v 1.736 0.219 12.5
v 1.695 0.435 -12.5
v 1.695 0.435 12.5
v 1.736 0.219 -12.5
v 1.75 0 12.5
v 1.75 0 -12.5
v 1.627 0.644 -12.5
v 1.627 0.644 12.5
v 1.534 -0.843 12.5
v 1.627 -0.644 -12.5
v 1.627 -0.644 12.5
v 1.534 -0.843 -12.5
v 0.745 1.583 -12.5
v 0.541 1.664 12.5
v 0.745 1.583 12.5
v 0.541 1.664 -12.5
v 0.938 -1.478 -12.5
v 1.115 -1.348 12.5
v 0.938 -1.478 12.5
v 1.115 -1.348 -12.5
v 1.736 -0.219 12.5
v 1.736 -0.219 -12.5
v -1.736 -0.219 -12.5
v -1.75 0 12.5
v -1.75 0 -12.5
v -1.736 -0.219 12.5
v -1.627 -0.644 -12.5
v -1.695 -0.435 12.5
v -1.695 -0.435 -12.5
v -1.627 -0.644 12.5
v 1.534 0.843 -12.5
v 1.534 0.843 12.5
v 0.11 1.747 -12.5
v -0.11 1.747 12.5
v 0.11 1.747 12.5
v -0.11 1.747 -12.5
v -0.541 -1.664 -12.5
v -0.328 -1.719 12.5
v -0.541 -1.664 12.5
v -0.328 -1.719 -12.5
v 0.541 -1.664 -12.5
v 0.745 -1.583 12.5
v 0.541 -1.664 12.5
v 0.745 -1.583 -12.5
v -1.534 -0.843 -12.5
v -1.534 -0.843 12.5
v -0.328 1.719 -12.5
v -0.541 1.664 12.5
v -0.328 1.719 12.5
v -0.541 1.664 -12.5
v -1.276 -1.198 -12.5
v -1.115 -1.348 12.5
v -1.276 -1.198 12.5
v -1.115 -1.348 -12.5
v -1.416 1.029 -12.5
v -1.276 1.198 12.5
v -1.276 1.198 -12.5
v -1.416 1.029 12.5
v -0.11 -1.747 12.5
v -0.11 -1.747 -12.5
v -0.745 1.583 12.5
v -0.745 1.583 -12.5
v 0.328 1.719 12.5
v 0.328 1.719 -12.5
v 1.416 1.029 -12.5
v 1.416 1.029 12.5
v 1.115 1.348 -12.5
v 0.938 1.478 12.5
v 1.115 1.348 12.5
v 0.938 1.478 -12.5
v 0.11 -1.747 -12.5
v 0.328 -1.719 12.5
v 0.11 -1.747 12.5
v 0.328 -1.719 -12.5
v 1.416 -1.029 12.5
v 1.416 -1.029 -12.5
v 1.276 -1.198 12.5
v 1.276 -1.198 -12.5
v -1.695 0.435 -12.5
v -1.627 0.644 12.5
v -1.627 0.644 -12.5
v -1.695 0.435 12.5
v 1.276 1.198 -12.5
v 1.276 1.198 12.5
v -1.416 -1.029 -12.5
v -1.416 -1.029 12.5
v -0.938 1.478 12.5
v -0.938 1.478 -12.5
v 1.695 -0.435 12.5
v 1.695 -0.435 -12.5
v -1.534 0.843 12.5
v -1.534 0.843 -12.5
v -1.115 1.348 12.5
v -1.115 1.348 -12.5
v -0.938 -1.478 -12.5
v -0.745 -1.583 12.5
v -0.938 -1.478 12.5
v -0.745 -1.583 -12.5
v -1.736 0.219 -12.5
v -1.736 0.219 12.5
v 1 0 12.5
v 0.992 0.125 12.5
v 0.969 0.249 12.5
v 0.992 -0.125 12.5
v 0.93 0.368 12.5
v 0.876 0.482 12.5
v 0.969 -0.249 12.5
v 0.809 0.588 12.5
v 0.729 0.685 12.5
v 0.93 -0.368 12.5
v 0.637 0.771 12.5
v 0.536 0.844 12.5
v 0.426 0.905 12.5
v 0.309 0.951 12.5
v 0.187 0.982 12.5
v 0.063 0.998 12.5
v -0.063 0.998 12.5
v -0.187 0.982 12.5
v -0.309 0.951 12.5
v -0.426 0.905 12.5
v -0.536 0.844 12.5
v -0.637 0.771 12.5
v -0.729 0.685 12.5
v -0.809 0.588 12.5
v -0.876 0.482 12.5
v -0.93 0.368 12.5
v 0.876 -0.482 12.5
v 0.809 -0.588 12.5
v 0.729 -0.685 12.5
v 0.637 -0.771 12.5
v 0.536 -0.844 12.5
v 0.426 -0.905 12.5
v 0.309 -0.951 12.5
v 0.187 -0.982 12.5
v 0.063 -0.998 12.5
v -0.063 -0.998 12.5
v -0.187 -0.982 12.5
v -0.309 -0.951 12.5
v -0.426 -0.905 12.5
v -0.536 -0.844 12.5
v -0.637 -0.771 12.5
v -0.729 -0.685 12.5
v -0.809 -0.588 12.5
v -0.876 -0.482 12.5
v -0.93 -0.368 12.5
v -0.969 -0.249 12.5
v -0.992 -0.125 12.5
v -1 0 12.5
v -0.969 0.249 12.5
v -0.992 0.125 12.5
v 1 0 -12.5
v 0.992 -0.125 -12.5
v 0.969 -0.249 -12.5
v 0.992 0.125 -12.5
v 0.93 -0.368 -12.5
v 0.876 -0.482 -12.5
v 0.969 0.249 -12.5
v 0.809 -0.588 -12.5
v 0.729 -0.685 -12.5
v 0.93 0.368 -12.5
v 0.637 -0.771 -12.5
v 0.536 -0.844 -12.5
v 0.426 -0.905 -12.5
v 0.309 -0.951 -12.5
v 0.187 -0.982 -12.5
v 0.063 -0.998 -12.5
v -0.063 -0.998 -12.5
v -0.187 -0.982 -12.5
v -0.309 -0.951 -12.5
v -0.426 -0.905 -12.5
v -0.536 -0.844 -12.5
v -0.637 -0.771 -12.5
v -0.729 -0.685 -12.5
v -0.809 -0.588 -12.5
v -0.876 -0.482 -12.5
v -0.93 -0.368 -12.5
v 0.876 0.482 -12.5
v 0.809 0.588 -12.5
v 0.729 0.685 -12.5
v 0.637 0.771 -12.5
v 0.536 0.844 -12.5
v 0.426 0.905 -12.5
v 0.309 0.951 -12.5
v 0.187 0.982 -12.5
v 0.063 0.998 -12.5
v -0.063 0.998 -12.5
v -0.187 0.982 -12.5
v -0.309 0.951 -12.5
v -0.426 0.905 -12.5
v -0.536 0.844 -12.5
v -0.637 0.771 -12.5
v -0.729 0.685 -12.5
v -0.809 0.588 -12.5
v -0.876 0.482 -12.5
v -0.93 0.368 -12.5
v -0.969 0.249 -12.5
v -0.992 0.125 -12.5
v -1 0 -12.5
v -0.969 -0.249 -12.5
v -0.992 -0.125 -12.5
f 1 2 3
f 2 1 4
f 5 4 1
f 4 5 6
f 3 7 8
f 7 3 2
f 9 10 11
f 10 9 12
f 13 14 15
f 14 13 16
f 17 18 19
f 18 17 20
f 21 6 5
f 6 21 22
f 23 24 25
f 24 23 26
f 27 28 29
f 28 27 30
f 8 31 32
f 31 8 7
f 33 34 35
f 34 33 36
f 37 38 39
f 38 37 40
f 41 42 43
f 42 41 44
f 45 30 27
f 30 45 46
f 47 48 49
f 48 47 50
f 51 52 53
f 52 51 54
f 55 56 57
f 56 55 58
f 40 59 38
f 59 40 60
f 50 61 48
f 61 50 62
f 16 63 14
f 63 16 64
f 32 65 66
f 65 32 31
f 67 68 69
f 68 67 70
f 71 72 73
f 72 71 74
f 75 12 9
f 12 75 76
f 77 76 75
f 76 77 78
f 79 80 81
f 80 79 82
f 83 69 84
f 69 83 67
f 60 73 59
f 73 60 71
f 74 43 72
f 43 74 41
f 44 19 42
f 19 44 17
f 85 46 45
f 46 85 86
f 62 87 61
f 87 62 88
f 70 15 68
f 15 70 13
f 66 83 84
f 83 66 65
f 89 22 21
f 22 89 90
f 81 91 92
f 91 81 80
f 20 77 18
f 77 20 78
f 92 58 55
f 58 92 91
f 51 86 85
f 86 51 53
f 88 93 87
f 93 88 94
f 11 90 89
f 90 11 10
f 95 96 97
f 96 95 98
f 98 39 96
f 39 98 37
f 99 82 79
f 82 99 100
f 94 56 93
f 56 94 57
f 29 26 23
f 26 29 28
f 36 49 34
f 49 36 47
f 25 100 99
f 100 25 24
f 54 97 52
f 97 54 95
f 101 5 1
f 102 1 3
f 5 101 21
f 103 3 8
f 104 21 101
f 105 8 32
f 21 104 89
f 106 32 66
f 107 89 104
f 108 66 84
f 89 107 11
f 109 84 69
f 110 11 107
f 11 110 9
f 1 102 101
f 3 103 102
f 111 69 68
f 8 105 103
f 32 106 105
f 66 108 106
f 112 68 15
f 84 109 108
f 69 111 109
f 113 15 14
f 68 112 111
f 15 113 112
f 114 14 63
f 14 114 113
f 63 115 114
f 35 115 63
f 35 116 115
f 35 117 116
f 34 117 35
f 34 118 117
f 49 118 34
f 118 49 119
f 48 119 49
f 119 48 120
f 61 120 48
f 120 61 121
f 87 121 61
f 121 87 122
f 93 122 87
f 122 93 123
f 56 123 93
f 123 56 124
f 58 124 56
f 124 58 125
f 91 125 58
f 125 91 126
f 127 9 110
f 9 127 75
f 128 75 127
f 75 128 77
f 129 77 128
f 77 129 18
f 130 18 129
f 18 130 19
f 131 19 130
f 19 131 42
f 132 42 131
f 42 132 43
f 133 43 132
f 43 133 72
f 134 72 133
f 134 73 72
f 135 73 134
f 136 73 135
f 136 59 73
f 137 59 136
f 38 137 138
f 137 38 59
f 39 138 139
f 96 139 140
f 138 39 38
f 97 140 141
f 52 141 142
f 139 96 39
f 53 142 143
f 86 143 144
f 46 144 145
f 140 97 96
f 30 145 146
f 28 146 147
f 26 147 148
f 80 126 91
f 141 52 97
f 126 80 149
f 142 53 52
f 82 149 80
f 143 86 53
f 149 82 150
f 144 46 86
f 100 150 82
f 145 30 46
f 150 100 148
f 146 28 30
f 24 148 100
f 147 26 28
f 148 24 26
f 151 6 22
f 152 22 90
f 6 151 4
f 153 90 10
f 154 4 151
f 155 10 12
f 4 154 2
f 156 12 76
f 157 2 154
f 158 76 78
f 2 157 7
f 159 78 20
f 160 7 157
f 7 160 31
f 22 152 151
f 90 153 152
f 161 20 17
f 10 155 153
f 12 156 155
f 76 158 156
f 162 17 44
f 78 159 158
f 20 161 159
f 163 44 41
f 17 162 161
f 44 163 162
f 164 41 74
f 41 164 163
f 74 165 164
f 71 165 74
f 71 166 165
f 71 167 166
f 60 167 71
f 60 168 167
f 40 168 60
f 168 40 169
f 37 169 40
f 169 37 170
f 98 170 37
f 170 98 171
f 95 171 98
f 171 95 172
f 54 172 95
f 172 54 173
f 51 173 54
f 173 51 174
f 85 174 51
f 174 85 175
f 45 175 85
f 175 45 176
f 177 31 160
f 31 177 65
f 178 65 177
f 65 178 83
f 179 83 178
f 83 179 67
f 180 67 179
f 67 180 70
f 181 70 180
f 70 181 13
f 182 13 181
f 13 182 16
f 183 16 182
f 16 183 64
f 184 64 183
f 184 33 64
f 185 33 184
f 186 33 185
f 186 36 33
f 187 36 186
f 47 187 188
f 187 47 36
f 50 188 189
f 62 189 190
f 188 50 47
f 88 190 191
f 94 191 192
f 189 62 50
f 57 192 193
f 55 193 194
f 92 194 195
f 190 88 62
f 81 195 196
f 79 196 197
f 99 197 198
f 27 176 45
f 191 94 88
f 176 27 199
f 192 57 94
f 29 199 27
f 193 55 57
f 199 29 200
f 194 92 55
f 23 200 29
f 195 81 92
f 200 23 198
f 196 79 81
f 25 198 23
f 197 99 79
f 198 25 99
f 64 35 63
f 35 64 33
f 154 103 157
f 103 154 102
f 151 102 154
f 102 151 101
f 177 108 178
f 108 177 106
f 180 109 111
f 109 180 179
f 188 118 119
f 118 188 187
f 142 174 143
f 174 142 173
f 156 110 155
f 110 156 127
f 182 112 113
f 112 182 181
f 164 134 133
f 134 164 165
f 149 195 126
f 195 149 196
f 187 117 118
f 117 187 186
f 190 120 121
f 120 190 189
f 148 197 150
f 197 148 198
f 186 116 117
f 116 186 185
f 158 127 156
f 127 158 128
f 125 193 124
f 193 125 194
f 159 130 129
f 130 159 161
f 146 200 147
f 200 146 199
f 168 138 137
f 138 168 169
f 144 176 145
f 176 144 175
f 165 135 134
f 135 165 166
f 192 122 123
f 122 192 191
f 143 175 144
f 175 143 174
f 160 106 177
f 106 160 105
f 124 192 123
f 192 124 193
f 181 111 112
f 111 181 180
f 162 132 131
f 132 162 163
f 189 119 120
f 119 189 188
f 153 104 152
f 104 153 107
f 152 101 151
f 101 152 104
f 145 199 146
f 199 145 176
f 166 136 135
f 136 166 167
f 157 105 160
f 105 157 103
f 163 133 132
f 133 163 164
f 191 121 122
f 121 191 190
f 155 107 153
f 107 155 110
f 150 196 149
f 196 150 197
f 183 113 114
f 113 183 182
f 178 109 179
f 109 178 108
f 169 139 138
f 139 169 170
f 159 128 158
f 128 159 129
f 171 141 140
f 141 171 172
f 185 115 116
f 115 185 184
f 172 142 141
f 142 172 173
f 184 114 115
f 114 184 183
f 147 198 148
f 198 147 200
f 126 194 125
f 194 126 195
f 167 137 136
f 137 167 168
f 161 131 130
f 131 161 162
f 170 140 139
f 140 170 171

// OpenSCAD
$fn = 50;


difference() {
	union() {
		translate(v = [0, 0, -12.5000000000]) {
			cylinder(h = 25, r = 1.7500000000);
		}
	}
	union() {
		translate(v = [0, 0, -100.0000000000]) {
			cylinder(h = 200, r = 1.0000000000);
		}
	}
}
